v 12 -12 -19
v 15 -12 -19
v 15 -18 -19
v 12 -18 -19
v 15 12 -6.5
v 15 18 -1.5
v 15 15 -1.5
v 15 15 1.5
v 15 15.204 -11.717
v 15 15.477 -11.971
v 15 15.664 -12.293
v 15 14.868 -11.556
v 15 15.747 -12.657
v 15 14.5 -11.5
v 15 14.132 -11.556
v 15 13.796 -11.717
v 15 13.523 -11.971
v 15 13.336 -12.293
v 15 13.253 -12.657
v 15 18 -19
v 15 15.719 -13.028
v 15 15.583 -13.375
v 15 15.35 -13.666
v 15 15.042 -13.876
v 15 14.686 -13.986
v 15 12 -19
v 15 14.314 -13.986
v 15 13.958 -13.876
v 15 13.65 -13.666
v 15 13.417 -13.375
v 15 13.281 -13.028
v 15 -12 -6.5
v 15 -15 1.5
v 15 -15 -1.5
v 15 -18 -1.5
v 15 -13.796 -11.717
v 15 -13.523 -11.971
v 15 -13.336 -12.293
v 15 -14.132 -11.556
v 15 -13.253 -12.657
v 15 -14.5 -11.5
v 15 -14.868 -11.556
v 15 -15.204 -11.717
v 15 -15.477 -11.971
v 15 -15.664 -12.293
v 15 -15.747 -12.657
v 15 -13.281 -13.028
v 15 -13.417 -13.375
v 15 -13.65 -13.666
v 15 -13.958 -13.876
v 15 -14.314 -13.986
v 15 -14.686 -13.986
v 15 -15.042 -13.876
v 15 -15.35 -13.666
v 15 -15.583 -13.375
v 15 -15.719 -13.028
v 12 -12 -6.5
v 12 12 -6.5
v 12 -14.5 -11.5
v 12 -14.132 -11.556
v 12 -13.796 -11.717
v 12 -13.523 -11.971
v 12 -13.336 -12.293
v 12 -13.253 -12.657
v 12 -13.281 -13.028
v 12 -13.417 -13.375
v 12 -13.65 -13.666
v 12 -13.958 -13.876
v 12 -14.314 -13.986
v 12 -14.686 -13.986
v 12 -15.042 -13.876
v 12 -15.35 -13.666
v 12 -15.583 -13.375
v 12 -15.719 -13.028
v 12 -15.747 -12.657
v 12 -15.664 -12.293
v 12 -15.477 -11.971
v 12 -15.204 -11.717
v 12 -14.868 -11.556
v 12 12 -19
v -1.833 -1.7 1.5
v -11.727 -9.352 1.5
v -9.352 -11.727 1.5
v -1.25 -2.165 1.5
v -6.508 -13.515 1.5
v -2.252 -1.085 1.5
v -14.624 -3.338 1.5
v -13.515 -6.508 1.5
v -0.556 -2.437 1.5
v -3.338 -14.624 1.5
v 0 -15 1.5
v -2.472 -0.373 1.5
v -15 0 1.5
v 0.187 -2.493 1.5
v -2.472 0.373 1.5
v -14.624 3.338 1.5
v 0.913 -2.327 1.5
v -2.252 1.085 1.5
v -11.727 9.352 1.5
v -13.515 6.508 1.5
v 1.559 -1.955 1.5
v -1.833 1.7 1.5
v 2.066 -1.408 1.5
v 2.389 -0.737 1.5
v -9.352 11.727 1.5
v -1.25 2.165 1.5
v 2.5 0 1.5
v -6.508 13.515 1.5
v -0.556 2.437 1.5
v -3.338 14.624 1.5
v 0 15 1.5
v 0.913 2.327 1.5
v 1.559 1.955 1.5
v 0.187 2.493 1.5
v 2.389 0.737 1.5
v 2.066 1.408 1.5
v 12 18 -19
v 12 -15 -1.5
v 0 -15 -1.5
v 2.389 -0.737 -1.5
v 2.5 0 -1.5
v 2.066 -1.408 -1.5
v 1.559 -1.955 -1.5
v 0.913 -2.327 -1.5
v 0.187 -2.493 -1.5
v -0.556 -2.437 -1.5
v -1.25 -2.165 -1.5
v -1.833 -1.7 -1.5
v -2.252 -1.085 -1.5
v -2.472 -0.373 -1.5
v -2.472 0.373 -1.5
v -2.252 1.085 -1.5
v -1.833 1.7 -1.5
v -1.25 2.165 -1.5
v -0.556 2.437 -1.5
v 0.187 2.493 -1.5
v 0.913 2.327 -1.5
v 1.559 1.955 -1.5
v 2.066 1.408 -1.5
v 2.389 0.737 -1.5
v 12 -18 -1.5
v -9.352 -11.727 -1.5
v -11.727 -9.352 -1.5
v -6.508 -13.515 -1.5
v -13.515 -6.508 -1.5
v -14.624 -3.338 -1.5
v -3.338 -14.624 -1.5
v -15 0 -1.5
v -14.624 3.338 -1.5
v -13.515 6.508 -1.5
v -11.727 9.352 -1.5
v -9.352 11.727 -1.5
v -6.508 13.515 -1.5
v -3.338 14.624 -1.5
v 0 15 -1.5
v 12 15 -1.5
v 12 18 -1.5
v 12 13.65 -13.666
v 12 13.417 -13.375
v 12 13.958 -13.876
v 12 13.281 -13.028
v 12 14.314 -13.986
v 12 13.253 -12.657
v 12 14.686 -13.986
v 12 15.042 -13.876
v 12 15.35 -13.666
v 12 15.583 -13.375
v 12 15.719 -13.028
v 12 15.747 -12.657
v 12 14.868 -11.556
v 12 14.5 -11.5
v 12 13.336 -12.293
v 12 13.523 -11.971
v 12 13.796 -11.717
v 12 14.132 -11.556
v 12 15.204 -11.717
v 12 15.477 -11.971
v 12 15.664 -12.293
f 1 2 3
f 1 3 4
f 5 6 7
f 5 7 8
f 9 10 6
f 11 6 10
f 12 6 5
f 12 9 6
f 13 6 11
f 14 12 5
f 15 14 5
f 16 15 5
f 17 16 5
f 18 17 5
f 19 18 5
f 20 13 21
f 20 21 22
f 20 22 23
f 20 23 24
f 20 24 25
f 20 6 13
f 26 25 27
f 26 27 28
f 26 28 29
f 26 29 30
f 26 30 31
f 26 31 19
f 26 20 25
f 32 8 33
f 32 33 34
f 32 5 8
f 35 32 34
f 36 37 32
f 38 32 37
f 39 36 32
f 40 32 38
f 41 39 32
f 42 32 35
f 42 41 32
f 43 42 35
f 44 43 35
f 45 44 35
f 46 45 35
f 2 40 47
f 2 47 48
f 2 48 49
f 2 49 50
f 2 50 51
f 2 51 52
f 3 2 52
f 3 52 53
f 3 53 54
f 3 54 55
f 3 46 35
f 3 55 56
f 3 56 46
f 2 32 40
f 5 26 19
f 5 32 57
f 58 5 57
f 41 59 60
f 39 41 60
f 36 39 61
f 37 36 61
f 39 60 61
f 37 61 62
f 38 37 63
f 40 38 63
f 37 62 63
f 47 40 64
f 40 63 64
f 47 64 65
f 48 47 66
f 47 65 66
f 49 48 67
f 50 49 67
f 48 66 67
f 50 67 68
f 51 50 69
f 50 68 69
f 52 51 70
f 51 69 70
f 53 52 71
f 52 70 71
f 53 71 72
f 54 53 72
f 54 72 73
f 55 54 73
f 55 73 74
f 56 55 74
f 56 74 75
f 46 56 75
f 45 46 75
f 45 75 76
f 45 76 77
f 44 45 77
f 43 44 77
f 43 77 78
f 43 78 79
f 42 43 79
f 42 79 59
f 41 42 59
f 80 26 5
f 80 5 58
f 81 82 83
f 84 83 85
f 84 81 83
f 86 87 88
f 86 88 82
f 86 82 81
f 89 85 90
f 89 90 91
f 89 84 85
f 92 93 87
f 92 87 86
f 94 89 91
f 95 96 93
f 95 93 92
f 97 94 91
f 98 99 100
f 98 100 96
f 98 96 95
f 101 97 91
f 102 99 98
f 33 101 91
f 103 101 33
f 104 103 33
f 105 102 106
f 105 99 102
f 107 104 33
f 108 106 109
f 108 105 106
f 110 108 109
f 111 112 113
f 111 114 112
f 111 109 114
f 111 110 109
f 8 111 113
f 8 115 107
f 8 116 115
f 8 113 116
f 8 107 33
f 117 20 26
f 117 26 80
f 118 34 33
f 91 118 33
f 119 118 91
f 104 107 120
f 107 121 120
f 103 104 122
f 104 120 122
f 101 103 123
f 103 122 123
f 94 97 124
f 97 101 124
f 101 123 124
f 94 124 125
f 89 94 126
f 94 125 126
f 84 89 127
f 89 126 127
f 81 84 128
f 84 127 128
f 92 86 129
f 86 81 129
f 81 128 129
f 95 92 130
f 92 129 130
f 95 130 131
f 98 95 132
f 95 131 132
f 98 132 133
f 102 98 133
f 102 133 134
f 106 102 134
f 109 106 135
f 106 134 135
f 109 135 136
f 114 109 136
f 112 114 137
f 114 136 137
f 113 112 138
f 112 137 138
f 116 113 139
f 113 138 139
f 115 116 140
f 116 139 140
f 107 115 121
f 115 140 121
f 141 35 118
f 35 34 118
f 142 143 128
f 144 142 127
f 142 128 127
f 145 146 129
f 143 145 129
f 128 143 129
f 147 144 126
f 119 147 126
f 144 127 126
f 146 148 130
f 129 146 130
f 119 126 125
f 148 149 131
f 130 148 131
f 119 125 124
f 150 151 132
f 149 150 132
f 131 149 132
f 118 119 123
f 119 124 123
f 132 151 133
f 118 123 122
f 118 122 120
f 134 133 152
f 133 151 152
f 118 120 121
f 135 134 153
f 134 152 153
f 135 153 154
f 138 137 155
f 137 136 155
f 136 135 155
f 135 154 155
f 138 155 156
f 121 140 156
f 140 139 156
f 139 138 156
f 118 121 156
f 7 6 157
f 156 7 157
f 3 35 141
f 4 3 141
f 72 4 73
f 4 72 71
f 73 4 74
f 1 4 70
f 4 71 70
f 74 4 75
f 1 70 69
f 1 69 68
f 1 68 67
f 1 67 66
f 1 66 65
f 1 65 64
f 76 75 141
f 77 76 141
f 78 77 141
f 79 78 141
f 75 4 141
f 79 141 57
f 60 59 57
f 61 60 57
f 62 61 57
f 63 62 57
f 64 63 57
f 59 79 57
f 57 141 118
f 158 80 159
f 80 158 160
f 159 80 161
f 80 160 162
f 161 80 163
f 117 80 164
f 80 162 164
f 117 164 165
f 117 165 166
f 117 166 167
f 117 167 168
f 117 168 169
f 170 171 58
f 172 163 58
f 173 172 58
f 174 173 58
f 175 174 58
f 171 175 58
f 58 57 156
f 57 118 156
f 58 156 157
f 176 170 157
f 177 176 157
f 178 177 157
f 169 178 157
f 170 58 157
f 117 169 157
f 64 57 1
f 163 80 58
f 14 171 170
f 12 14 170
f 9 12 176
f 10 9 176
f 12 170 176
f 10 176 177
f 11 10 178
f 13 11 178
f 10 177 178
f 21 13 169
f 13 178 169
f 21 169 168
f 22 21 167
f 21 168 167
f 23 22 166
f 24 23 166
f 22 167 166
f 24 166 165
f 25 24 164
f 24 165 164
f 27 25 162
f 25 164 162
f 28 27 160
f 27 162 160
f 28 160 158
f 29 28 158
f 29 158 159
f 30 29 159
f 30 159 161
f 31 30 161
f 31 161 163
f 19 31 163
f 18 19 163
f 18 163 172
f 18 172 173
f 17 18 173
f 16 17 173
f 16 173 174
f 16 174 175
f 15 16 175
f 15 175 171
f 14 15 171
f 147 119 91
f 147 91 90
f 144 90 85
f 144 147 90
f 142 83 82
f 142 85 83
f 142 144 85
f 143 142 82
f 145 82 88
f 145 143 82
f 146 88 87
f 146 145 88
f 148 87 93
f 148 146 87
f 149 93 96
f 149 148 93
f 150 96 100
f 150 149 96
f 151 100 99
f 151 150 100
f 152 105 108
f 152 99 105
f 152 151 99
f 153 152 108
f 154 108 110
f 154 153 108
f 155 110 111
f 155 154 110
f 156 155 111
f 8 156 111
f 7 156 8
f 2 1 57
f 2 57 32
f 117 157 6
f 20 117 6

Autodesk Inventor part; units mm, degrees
ref_plane "YZ Plane" through (0, 0, 0) normal (1, 0, 0) x (0, 1, 0)
ref_plane "XZ Plane" through (0, 0, 0) normal (0, 1, 0) x (-1, 0, 0)
ref_plane "XY Plane" through (0, 0, 0) normal (0, 0, 1) x (1, 0, 0)
sketch "草圖1" plane through (0, 0, 0) normal (0, 0, 1) x (1, 0, 0)
  circle A0 centre (0, 0) radius 2.5
  circle A1 centre (0, 0) radius 15
  dimension "d0" = 5
  dimension "d1" = 30
extrude "擠出1" add sketch "草圖1" along normal mid plane 3
sketch "草圖2" plane through (0, 0, -1.5) normal (0, 0, -1) x (-1, 0, 0)
  circle A0 centre (0, 0) radius 15 projected
  circle A1 centre (0, 0) radius 2.5 construction
  line L0 (0, 15) -> (-15, 15)
  line L1 (-15, 15) -> (-15, -15)
  line L2 (-15, -15) -> (0, -15)
  line L3 (0, -15) -> (0, 15) construction
  circle A2 centre (0, 0) radius 15 projected
  point P0 (0, -15)
  point P1 (-15, 0)
extrude "擠出2" add sketch "草圖2" against normal blind 3 contours A0 L1 L0 | L2 L1 A0
sketch "草圖3" plane through (0, 0, -1.5) normal (0, 0, -1) x (-1, 0, 0)
  arc A0 (0, -15) -> (0, 15) centre (0, 0) ccw projected
  line L0 (0, 15) -> (-15, 15) projected
  line L1 (-15, 15) -> (-15, -15) projected
  line L2 (-15, -15) -> (0, -15) projected
  circle A1 centre (0, 0) radius 2.5 projected
  line L3 (-15, 15) -> (0, 15) projected
  line L4 (-12, 18) -> (-15, 18)
  line L5 (-15, 18) -> (-15, -18)
  line L6 (-15, -18) -> (-12, -18)
  line L7 (-12, -18) -> (-12, 18)
  point P0 (-15, 0)
  dimension "d13" = 36
  dimension "d14" = 3
extrude "擠出3" add sketch "草圖3" along normal blind 17.5 contours L7 L6 L5 L2 | L2 L1 L0 L7 | L0 L5 L4 L7
sketch "草圖5" plane through (0, 0, -19) normal (0, 0, -1) x (-1, 0, 0)
  line L0 (-12, -18) -> (-12, 18) projected
  line L1 (-12, 18) -> (-15, 18) projected
  line L2 (-15, 18) -> (-15, -18) projected
  line L3 (-15, -18) -> (-12, -18) projected
  line L4 (-15, 12) -> (-12, 12)
  line L5 (-12, 12) -> (-12, -12)
  line L6 (-12, -12) -> (-15, -12)
  line L7 (-15, -12) -> (-15, 12)
  point P0 (0, 0)
  point P1 (-15, 0)
  point P2 (-13.5, -12)
  point P3 (-13.5, 12)
  dimension "d15" = 24
extrude "擠出5" cut sketch "草圖5" against normal blind 12.5 contours L6 L2 L4 L0
sketch "草圖6" plane through (12, -18, -1.5) normal (-1, 0, 0) x (0, 0, 1)
  line L0 (-17.5, 30) -> (-5, 30) construction
  line L1 (-5, 30) -> (-5, 6) construction
  line L2 (-5, 6) -> (-17.5, 6) construction
  line L3 (-17.5, 0) -> (-17.5, 6) construction
  line L4 (0, 0) -> (-17.5, 0) construction
  line L5 (0, 0) -> (0, 3) construction
  line L6 (0, 33) -> (0, 3) construction
  line L7 (0, 33) -> (0, 36) construction
  line L8 (0, 36) -> (-17.5, 36) construction
  line L9 (-17.5, 30) -> (-17.5, 36) construction
  line L10 (-11.25, 36) -> (-11.25, 0) construction
  line L11 (0, 0) -> (-17.5, 0) construction
  circle A0 centre (-11.25, 32.5) radius 1.25
  circle A1 centre (-11.25, 3.5) radius 1.25
  line L12 (-11.25, 18) -> (-8.75, 18) construction
  point P0 (1.5, 18)
  point P1 (-11.25, 30)
  dimension "d18" = 2.5
  dimension "d19" = 29
extrude "擠出6" cut sketch "草圖6" against normal up to surface (3 mm away)
properties part number "Pad_2"
